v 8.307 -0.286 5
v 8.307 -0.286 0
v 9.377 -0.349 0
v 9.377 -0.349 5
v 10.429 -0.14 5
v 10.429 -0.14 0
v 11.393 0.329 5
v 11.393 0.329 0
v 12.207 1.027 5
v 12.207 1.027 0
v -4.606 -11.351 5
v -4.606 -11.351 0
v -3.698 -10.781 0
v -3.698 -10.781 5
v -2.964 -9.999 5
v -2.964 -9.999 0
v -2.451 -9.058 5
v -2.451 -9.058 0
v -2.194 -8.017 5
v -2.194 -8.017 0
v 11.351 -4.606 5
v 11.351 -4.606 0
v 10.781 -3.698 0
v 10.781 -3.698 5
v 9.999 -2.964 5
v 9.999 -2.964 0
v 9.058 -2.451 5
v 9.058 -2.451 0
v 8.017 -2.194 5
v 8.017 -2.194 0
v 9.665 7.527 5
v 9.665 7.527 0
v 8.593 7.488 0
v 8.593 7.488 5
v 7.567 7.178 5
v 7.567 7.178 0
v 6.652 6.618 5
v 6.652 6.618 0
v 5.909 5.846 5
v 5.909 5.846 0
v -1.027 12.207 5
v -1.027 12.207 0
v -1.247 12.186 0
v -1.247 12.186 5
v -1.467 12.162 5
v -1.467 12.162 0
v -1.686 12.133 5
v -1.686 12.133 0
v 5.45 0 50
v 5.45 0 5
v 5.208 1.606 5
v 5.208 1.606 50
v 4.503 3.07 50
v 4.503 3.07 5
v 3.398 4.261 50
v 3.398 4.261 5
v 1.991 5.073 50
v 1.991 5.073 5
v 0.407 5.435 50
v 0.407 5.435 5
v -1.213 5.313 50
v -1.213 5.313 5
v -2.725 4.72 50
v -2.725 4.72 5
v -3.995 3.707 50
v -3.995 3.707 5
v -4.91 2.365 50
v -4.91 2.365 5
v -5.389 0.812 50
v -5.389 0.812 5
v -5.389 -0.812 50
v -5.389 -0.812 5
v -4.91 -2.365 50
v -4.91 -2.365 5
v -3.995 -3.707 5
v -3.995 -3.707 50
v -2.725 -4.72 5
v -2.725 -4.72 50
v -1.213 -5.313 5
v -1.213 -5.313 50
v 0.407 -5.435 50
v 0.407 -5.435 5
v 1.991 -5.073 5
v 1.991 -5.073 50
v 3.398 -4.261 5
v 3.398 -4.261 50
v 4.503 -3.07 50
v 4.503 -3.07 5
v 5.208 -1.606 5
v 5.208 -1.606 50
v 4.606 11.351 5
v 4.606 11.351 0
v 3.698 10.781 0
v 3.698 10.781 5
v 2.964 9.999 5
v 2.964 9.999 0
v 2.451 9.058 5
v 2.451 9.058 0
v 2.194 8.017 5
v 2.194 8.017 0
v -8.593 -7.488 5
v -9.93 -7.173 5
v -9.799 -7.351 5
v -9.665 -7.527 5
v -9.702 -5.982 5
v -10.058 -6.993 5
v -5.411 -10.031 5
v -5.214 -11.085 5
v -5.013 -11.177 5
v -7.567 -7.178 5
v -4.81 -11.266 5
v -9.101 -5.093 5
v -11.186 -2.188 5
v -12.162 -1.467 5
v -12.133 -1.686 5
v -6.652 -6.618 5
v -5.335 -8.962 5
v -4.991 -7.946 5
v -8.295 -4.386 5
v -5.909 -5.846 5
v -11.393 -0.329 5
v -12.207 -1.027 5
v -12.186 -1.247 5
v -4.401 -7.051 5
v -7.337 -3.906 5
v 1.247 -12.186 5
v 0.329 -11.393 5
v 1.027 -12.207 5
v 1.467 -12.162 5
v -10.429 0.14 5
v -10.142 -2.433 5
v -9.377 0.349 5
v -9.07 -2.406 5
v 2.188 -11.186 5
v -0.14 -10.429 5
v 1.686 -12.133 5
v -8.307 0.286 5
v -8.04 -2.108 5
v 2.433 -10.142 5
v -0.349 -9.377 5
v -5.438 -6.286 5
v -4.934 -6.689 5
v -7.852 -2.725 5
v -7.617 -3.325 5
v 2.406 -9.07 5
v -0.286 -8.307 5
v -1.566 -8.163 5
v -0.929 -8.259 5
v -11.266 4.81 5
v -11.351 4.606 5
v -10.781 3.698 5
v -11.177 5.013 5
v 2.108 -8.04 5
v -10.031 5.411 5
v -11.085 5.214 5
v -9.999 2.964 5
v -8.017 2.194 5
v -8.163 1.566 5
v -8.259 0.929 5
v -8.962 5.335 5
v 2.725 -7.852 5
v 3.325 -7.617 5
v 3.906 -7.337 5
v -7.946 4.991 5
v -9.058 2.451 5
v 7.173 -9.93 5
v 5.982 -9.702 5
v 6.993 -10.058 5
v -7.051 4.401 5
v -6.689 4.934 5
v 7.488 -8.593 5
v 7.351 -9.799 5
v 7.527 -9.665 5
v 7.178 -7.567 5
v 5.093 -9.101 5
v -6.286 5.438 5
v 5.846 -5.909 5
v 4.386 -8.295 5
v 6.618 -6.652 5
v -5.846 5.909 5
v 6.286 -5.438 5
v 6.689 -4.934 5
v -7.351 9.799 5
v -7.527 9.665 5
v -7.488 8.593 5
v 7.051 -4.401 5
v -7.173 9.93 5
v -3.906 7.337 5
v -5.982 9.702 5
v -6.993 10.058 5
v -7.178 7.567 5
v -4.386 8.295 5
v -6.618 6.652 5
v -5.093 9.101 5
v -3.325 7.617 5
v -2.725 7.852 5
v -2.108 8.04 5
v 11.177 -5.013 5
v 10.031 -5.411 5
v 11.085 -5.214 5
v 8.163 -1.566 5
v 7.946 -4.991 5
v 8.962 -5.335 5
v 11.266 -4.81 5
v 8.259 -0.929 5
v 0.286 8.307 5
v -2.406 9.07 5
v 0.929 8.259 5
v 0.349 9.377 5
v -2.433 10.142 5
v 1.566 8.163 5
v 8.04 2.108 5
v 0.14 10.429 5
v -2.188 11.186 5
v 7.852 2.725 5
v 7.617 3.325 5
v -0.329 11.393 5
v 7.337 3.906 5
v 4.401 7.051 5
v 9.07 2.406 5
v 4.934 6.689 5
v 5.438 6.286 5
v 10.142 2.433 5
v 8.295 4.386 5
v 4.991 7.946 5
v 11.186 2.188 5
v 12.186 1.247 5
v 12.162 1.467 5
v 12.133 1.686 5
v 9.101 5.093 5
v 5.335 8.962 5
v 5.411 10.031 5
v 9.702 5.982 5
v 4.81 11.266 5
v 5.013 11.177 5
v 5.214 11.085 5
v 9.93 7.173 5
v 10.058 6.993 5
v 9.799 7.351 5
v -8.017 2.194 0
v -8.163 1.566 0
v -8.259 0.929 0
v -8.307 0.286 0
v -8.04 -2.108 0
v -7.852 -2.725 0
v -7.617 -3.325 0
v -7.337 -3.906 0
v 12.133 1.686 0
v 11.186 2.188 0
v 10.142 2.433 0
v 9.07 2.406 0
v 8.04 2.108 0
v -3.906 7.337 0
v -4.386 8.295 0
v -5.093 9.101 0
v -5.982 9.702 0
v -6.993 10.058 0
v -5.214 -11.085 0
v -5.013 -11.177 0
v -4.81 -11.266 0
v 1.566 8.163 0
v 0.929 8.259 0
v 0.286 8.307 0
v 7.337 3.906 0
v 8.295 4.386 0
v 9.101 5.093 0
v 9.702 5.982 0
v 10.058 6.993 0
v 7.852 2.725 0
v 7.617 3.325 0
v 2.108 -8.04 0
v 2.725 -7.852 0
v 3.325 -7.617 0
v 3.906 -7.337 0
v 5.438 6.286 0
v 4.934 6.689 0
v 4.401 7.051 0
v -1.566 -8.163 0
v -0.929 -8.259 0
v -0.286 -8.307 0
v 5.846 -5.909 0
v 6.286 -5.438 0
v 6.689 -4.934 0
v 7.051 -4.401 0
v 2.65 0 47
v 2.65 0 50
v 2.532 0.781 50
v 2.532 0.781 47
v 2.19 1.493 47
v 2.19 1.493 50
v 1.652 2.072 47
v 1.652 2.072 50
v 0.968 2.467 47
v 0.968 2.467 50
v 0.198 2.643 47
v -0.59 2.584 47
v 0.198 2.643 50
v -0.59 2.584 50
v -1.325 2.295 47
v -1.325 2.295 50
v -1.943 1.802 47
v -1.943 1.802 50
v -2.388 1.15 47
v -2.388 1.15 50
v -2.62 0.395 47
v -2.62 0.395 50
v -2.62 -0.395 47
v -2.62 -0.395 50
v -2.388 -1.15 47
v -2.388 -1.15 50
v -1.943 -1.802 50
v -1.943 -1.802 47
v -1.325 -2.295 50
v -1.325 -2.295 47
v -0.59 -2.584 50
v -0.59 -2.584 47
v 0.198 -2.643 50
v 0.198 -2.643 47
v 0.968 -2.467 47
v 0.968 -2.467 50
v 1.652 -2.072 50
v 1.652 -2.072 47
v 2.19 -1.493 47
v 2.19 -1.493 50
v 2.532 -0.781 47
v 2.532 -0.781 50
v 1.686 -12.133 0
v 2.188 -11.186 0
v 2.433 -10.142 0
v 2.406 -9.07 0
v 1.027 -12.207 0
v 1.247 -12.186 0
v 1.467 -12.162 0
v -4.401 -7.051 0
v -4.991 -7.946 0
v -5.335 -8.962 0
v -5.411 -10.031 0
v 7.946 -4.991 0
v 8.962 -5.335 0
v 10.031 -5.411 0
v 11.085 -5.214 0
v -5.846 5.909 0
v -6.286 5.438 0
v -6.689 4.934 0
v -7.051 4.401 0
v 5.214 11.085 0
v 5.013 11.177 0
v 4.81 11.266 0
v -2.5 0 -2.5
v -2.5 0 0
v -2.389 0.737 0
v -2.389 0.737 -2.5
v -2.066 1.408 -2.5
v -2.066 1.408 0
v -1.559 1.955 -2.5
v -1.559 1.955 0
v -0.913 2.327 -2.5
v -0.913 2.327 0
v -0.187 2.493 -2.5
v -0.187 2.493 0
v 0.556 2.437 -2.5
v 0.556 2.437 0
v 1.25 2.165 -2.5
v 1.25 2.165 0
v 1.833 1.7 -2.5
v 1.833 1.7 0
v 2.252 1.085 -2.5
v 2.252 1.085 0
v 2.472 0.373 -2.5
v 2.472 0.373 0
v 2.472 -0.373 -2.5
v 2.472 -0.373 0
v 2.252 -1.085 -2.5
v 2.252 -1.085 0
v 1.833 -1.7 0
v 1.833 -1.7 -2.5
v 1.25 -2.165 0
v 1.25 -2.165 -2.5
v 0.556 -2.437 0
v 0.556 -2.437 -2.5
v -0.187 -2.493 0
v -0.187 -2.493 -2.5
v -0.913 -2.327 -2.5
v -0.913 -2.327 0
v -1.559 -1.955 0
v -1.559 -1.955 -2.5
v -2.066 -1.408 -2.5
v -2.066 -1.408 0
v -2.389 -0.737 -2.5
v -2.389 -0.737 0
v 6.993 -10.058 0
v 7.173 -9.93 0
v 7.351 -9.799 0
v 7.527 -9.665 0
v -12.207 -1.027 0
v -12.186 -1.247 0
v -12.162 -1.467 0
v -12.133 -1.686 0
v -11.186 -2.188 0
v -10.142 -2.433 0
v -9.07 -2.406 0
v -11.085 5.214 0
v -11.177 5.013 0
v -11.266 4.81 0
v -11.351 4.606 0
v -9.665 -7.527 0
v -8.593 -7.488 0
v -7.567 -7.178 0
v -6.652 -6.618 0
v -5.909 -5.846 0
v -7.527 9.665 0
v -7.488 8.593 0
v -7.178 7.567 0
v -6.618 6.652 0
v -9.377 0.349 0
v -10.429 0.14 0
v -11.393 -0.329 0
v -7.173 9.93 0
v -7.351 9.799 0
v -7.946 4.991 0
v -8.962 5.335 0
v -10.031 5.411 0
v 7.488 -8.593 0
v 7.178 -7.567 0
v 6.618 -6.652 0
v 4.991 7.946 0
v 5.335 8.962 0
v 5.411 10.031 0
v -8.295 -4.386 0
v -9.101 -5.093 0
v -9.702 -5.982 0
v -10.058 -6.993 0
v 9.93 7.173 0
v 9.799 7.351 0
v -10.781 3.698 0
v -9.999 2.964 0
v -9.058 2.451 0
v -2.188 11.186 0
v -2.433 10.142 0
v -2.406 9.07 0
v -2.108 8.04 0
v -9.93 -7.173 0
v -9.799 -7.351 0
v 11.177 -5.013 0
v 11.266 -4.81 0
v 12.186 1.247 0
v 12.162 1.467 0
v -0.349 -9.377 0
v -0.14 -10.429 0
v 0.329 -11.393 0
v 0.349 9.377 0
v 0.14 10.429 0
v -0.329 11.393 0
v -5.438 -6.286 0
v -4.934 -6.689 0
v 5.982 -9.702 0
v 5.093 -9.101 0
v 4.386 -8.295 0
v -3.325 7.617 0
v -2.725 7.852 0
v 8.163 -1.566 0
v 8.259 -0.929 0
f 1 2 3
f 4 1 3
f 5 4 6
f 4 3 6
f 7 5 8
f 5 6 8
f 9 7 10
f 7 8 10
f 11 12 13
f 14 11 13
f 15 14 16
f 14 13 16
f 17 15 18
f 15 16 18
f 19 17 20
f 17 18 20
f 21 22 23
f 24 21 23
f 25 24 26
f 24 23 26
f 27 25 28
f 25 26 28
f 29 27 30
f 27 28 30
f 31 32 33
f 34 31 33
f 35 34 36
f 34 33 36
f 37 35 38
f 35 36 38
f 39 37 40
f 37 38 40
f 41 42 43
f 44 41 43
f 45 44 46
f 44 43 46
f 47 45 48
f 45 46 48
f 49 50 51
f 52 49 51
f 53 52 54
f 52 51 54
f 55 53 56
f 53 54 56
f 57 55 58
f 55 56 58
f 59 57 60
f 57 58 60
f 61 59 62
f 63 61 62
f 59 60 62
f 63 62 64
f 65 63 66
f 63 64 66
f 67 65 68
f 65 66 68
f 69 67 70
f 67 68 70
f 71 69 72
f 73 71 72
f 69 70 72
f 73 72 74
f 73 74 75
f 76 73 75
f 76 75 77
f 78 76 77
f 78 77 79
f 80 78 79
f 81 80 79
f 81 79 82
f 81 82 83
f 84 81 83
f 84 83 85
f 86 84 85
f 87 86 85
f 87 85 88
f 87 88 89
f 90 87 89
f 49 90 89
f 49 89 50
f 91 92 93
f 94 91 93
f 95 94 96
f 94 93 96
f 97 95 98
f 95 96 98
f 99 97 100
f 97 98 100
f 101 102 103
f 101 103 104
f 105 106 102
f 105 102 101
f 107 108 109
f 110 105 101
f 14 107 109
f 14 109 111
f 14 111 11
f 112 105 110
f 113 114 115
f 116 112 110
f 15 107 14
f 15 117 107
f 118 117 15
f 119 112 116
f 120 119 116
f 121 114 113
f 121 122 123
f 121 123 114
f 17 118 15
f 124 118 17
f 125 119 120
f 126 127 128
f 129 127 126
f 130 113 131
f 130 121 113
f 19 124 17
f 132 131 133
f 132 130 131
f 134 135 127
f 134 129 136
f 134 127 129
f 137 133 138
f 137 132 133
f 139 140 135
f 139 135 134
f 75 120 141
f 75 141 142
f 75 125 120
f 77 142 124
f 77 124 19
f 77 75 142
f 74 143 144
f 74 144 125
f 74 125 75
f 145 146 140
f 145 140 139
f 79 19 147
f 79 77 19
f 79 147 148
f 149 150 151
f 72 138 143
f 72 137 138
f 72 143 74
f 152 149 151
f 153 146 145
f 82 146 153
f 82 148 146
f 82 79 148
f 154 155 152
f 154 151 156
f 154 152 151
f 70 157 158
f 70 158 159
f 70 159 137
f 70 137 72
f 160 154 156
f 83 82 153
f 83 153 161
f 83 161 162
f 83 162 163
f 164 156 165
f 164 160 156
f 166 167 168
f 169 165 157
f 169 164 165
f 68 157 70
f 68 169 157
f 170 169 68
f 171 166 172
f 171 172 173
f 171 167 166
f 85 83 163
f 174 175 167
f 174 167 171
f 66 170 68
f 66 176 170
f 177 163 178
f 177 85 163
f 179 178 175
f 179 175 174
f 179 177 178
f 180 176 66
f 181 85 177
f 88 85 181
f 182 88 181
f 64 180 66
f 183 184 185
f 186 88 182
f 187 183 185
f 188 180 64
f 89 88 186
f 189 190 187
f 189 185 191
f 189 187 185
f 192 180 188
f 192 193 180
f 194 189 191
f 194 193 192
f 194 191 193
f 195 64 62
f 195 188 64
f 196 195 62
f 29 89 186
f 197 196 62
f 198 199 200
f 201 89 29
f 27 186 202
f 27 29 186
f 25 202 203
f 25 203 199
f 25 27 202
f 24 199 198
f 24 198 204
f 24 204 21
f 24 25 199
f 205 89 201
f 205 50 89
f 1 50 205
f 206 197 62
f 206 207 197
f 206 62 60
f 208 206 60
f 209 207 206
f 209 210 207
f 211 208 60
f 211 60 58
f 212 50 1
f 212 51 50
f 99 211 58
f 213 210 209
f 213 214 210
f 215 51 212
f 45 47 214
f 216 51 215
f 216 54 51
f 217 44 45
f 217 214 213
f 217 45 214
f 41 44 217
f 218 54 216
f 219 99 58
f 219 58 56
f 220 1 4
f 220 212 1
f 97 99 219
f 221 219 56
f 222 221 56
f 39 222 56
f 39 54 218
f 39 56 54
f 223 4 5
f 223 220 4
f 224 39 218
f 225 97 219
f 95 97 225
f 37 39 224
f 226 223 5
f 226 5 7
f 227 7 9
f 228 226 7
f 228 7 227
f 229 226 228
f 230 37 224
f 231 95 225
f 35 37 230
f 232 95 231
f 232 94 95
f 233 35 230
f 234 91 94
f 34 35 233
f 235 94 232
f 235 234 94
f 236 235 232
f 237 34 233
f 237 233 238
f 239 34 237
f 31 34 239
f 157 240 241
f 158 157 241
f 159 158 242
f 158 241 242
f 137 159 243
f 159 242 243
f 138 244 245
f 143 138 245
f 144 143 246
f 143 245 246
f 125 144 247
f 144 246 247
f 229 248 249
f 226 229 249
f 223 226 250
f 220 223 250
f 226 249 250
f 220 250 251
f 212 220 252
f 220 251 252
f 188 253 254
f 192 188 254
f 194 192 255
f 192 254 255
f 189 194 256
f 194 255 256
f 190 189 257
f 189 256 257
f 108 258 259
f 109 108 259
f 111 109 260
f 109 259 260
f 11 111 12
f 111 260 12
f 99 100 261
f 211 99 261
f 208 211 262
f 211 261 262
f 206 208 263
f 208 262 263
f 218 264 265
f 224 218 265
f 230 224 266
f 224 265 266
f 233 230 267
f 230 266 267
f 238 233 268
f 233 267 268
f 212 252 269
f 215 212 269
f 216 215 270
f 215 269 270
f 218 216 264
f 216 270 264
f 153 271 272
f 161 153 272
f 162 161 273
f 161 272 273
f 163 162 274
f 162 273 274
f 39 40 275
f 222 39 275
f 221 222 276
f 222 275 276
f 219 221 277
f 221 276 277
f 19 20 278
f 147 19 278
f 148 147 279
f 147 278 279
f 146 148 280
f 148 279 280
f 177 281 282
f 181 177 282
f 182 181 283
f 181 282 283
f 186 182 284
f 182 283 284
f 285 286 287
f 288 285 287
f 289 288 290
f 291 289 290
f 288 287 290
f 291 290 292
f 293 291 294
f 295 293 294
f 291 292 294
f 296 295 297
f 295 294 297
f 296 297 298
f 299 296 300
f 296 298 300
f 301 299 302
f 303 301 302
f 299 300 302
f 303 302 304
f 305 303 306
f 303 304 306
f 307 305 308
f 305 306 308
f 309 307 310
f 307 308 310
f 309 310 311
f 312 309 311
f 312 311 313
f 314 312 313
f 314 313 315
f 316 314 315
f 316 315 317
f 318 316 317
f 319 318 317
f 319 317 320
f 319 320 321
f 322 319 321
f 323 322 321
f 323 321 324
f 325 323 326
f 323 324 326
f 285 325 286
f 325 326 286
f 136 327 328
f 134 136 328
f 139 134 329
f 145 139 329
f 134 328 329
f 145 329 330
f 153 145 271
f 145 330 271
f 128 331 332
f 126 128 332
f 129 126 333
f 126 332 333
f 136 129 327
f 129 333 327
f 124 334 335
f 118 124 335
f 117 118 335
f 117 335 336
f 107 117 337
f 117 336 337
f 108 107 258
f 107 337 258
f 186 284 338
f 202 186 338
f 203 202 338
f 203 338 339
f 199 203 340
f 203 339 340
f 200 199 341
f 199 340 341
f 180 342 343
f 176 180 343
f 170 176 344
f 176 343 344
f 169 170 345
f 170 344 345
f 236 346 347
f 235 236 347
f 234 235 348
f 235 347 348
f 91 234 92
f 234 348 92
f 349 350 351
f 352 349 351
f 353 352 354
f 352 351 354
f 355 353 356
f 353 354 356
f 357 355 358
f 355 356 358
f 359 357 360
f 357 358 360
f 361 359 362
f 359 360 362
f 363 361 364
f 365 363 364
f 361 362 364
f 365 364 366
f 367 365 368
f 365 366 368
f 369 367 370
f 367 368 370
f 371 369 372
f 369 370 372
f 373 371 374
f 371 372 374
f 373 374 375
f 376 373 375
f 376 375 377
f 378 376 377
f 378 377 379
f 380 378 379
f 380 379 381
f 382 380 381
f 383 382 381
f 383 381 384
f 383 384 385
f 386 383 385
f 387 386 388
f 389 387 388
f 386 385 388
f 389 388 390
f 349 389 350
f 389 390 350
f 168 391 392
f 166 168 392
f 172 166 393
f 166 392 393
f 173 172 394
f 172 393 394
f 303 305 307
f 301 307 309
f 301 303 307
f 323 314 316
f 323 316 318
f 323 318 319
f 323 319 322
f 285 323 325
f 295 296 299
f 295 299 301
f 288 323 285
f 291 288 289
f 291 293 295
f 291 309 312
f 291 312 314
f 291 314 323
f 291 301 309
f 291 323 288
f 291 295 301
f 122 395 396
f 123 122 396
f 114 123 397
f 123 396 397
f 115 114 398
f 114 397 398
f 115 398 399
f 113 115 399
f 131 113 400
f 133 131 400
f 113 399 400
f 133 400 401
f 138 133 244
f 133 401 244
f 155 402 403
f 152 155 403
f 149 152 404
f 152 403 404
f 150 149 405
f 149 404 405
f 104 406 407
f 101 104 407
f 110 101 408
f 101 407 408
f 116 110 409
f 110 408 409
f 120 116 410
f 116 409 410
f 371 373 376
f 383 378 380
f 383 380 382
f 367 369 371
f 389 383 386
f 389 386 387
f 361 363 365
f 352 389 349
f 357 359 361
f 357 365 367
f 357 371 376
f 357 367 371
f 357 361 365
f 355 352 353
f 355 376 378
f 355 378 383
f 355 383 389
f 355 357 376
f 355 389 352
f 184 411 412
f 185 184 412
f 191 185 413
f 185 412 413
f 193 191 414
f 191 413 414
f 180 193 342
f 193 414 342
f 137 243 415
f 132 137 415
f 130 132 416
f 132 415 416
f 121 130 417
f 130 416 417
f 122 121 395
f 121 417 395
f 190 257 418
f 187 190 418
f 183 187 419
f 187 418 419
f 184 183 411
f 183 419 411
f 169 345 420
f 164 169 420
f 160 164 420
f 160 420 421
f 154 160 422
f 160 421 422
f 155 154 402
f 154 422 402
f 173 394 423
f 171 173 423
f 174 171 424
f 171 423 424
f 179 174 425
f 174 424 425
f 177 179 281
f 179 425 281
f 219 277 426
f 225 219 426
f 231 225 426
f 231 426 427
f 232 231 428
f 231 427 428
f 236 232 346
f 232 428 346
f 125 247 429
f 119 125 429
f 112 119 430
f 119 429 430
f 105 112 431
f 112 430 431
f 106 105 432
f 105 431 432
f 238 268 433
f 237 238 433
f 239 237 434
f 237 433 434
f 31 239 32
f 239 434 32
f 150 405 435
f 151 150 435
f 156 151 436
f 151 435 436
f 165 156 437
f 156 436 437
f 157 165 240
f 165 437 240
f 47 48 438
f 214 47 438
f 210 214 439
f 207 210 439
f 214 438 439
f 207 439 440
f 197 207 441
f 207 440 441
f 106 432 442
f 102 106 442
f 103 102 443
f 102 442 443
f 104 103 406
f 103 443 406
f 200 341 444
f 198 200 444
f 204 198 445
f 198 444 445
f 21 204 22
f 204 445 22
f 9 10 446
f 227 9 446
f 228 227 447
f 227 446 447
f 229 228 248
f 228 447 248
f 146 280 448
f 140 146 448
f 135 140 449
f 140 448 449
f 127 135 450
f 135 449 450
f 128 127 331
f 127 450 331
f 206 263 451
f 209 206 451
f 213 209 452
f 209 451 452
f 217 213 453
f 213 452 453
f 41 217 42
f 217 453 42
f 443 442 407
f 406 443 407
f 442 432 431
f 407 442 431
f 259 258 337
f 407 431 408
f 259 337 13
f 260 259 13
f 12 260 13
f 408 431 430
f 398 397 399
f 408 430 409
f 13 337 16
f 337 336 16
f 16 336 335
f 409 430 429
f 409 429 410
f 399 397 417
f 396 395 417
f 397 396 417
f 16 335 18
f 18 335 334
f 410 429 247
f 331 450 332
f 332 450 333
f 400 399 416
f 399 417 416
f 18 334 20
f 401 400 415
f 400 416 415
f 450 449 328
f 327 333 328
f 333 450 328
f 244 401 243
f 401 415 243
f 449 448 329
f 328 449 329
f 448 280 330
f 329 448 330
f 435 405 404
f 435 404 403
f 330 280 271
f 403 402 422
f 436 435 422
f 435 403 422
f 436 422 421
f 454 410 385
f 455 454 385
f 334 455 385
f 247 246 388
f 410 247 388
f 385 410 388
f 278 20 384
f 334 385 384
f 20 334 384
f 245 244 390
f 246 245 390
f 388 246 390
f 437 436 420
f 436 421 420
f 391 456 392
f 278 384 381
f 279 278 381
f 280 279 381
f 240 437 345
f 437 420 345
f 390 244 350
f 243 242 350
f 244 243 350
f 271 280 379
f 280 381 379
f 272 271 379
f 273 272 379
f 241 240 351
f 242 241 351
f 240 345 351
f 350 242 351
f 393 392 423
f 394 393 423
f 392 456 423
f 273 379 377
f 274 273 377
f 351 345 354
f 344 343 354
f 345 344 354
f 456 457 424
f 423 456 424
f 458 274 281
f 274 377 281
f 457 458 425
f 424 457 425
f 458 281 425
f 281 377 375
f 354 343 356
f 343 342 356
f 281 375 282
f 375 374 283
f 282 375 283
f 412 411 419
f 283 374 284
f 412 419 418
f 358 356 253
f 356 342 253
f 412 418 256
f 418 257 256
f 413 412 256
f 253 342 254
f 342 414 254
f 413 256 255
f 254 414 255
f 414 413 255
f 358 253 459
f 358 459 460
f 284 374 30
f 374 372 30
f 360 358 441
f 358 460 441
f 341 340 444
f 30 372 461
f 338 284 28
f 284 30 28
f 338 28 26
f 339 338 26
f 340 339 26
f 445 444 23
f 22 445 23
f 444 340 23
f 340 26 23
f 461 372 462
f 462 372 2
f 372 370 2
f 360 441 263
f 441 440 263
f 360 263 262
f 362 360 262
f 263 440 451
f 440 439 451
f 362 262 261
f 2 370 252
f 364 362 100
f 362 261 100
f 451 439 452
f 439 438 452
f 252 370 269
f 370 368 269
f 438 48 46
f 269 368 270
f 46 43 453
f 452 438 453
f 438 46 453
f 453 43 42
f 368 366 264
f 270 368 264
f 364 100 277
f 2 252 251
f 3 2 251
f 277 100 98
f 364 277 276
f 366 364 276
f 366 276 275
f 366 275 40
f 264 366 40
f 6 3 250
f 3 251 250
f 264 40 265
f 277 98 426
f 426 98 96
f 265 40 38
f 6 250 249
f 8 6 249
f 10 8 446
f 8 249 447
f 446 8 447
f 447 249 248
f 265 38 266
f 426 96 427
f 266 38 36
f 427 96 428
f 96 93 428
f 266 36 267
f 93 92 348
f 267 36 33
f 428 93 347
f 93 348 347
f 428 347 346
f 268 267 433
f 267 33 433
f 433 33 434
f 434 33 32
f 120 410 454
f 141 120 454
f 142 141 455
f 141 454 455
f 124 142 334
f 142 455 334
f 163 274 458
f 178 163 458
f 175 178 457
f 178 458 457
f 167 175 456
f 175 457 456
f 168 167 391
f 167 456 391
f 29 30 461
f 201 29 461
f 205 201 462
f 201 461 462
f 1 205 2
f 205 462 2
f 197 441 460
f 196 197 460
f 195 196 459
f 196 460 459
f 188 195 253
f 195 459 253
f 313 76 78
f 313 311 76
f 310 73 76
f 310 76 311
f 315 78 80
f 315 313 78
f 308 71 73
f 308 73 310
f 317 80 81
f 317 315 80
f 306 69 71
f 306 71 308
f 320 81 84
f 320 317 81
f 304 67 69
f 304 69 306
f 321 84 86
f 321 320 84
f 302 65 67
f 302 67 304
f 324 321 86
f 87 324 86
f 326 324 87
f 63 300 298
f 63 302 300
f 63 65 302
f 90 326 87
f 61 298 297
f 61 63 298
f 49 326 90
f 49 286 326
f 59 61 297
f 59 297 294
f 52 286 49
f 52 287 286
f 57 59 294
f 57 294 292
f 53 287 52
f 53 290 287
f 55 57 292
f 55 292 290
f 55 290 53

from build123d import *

# Parameters (mm, degrees)
SKETCH1_R           = 5.45
BOSS_EXTRUDE1_DEPTH = 50
SKETCH6_R           = 2.5
BOSS_EXTRUDE2_DEPTH = 2.5
SKETCH7_R           = 2.65
CUT_EXTRUDE1_DEPTH  = 3
JOIN1_DEPTH         = 5


# Read off the part's stored shape, not the designer's step: Join1
with BuildPart() as part:
    # Sketch1 → Boss-Extrude1 (new body)
    with BuildSketch(Plane.XY):
        Circle(SKETCH1_R)
    extrude(amount=BOSS_EXTRUDE1_DEPTH)

    # Sketch6 → Boss-Extrude2 (add)
    with BuildSketch(Plane(origin=(0, 0, 0), x_dir=(-1, 0, 0), z_dir=(0, 0, -1))):
        Circle(SKETCH6_R)
    extrude(amount=BOSS_EXTRUDE2_DEPTH)

    # Sketch7 → Cut-Extrude1 (cut)
    with BuildSketch(Plane.XY.offset(50)):
        Circle(SKETCH7_R)
    extrude(amount=-CUT_EXTRUDE1_DEPTH, mode=Mode.SUBTRACT)

    # Join1 outline → Join1 (add)
    with BuildSketch(Plane.XY):
        with BuildLine():
            ThreePointArc((3.905791733, -7.336608426), (5.093273997, -9.101255459), (6.993020796, -10.05784073))
            ThreePointArc((6.993020796, -10.05784073), (7.262719681, -9.864856959), (7.527095748, -9.664643274))
            ThreePointArc((7.527095748, -9.664643274), (7.177895055, -7.56651264), (5.845552604, -5.908514788))
            ThreePointArc((5.845552604, -5.908514788), (6.492103401, -5.189761622), (7.050819075, -4.400793408))
            ThreePointArc((7.050819075, -4.400793408), (8.961532399, -5.335281436), (11.085054023, -5.213835182))
            ThreePointArc((11.085054023, -5.213835182), (11.222128224, -4.911856891), (11.350977771, -4.60627872))
            ThreePointArc((11.350977771, -4.60627872), (9.999495783, -2.963844637), (8.016654448, -2.194147603))
            ThreePointArc((8.016654448, -2.194147603), (8.21720728, -1.248413703), (8.306585141, -0.28578935))
            ThreePointArc((8.306585141, -0.28578935), (10.428555432, -0.13972306), (12.206855977, 1.027213293))
            ThreePointArc((12.206855977, 1.027213293), (12.174576572, 1.357271264), (12.133374467, 1.686334497))
            ThreePointArc((12.133374467, 1.686334497), (10.141739691, 2.432983143), (8.039700207, 2.10813966))
            ThreePointArc((8.039700207, 2.10813966), (7.740517104, 3.027445658), (7.336608426, 3.905791733))
            ThreePointArc((7.336608426, 3.905791733), (9.101255459, 5.093273997), (10.05784073, 6.993020796))
            ThreePointArc((10.05784073, 6.993020796), (9.864856959, 7.262719681), (9.664643274, 7.527095748))
            ThreePointArc((9.664643274, 7.527095748), (7.56651264, 7.177895055), (5.908514788, 5.845552604))
            ThreePointArc((5.908514788, 5.845552604), (5.189761622, 6.492103401), (4.400793408, 7.050819075))
            ThreePointArc((4.400793408, 7.050819075), (5.335281436, 8.961532399), (5.213835182, 11.085054023))
            ThreePointArc((5.213835182, 11.085054023), (4.911856891, 11.222128224), (4.60627872, 11.350977771))
            ThreePointArc((4.60627872, 11.350977771), (2.963844637, 9.999495783), (2.194147603, 8.016654448))
            ThreePointArc((2.194147603, 8.016654448), (1.248413703, 8.21720728), (0.28578935, 8.306585141))
            ThreePointArc((0.28578935, 8.306585141), (0.13972306, 10.428555432), (-1.027213293, 12.206855977))
            ThreePointArc((-1.027213293, 12.206855977), (-1.357271264, 12.174576572), (-1.686334497, 12.133374467))
            ThreePointArc((-1.686334497, 12.133374467), (-2.432983143, 10.141739691), (-2.10813966, 8.039700207))
            ThreePointArc((-2.10813966, 8.039700207), (-3.027445658, 7.740517104), (-3.905791733, 7.336608426))
            ThreePointArc((-3.905791733, 7.336608426), (-5.093273997, 9.101255459), (-6.993020796, 10.05784073))
            ThreePointArc((-6.993020796, 10.05784073), (-7.262719681, 9.864856959), (-7.527095748, 9.664643274))
            ThreePointArc((-7.527095748, 9.664643274), (-7.177895055, 7.56651264), (-5.845552604, 5.908514788))
            ThreePointArc((-5.845552604, 5.908514788), (-6.492103401, 5.189761622), (-7.050819075, 4.400793408))
            ThreePointArc((-7.050819075, 4.400793408), (-8.961532399, 5.335281436), (-11.085054023, 5.213835182))
            ThreePointArc((-11.085054023, 5.213835182), (-11.222128224, 4.911856891), (-11.350977771, 4.60627872))
            ThreePointArc((-11.350977771, 4.60627872), (-9.999495783, 2.963844637), (-8.016654448, 2.194147603))
            ThreePointArc((-8.016654448, 2.194147603), (-8.21720728, 1.248413703), (-8.306585141, 0.28578935))
            ThreePointArc((-8.306585141, 0.28578935), (-10.428555432, 0.13972306), (-12.206855977, -1.027213293))
            ThreePointArc((-12.206855977, -1.027213293), (-12.174576572, -1.357271264), (-12.133374467, -1.686334497))
            ThreePointArc((-12.133374467, -1.686334497), (-10.141739691, -2.432983143), (-8.039700207, -2.10813966))
            ThreePointArc((-8.039700207, -2.10813966), (-7.740517104, -3.027445658), (-7.336608426, -3.905791733))
            ThreePointArc((-7.336608426, -3.905791733), (-9.101255459, -5.093273997), (-10.05784073, -6.993020796))
            ThreePointArc((-10.05784073, -6.993020796), (-9.864856959, -7.262719681), (-9.664643274, -7.527095748))
            ThreePointArc((-9.664643274, -7.527095748), (-7.56651264, -7.177895055), (-5.908514788, -5.845552604))
            ThreePointArc((-5.908514788, -5.845552604), (-5.189761622, -6.492103401), (-4.400793408, -7.050819075))
            ThreePointArc((-4.400793408, -7.050819075), (-5.335281436, -8.961532399), (-5.213835182, -11.085054023))
            ThreePointArc((-5.213835182, -11.085054023), (-4.911856891, -11.222128224), (-4.60627872, -11.350977771))
            ThreePointArc((-4.60627872, -11.350977771), (-2.963844637, -9.999495783), (-2.194147603, -8.016654448))
            ThreePointArc((-2.194147603, -8.016654448), (-1.248413703, -8.21720728), (-0.28578935, -8.306585141))
            ThreePointArc((-0.28578935, -8.306585141), (-0.13972306, -10.428555432), (1.027213293, -12.206855977))
            ThreePointArc((1.027213293, -12.206855977), (1.357271264, -12.174576572), (1.686334497, -12.133374467))
            ThreePointArc((1.686334497, -12.133374467), (2.432983143, -10.141739691), (2.10813966, -8.039700207))
            ThreePointArc((2.10813966, -8.039700207), (3.027445658, -7.740517104), (3.905791733, -7.336608426))
        make_face()
    extrude(amount=JOIN1_DEPTH)


solid = part.part
